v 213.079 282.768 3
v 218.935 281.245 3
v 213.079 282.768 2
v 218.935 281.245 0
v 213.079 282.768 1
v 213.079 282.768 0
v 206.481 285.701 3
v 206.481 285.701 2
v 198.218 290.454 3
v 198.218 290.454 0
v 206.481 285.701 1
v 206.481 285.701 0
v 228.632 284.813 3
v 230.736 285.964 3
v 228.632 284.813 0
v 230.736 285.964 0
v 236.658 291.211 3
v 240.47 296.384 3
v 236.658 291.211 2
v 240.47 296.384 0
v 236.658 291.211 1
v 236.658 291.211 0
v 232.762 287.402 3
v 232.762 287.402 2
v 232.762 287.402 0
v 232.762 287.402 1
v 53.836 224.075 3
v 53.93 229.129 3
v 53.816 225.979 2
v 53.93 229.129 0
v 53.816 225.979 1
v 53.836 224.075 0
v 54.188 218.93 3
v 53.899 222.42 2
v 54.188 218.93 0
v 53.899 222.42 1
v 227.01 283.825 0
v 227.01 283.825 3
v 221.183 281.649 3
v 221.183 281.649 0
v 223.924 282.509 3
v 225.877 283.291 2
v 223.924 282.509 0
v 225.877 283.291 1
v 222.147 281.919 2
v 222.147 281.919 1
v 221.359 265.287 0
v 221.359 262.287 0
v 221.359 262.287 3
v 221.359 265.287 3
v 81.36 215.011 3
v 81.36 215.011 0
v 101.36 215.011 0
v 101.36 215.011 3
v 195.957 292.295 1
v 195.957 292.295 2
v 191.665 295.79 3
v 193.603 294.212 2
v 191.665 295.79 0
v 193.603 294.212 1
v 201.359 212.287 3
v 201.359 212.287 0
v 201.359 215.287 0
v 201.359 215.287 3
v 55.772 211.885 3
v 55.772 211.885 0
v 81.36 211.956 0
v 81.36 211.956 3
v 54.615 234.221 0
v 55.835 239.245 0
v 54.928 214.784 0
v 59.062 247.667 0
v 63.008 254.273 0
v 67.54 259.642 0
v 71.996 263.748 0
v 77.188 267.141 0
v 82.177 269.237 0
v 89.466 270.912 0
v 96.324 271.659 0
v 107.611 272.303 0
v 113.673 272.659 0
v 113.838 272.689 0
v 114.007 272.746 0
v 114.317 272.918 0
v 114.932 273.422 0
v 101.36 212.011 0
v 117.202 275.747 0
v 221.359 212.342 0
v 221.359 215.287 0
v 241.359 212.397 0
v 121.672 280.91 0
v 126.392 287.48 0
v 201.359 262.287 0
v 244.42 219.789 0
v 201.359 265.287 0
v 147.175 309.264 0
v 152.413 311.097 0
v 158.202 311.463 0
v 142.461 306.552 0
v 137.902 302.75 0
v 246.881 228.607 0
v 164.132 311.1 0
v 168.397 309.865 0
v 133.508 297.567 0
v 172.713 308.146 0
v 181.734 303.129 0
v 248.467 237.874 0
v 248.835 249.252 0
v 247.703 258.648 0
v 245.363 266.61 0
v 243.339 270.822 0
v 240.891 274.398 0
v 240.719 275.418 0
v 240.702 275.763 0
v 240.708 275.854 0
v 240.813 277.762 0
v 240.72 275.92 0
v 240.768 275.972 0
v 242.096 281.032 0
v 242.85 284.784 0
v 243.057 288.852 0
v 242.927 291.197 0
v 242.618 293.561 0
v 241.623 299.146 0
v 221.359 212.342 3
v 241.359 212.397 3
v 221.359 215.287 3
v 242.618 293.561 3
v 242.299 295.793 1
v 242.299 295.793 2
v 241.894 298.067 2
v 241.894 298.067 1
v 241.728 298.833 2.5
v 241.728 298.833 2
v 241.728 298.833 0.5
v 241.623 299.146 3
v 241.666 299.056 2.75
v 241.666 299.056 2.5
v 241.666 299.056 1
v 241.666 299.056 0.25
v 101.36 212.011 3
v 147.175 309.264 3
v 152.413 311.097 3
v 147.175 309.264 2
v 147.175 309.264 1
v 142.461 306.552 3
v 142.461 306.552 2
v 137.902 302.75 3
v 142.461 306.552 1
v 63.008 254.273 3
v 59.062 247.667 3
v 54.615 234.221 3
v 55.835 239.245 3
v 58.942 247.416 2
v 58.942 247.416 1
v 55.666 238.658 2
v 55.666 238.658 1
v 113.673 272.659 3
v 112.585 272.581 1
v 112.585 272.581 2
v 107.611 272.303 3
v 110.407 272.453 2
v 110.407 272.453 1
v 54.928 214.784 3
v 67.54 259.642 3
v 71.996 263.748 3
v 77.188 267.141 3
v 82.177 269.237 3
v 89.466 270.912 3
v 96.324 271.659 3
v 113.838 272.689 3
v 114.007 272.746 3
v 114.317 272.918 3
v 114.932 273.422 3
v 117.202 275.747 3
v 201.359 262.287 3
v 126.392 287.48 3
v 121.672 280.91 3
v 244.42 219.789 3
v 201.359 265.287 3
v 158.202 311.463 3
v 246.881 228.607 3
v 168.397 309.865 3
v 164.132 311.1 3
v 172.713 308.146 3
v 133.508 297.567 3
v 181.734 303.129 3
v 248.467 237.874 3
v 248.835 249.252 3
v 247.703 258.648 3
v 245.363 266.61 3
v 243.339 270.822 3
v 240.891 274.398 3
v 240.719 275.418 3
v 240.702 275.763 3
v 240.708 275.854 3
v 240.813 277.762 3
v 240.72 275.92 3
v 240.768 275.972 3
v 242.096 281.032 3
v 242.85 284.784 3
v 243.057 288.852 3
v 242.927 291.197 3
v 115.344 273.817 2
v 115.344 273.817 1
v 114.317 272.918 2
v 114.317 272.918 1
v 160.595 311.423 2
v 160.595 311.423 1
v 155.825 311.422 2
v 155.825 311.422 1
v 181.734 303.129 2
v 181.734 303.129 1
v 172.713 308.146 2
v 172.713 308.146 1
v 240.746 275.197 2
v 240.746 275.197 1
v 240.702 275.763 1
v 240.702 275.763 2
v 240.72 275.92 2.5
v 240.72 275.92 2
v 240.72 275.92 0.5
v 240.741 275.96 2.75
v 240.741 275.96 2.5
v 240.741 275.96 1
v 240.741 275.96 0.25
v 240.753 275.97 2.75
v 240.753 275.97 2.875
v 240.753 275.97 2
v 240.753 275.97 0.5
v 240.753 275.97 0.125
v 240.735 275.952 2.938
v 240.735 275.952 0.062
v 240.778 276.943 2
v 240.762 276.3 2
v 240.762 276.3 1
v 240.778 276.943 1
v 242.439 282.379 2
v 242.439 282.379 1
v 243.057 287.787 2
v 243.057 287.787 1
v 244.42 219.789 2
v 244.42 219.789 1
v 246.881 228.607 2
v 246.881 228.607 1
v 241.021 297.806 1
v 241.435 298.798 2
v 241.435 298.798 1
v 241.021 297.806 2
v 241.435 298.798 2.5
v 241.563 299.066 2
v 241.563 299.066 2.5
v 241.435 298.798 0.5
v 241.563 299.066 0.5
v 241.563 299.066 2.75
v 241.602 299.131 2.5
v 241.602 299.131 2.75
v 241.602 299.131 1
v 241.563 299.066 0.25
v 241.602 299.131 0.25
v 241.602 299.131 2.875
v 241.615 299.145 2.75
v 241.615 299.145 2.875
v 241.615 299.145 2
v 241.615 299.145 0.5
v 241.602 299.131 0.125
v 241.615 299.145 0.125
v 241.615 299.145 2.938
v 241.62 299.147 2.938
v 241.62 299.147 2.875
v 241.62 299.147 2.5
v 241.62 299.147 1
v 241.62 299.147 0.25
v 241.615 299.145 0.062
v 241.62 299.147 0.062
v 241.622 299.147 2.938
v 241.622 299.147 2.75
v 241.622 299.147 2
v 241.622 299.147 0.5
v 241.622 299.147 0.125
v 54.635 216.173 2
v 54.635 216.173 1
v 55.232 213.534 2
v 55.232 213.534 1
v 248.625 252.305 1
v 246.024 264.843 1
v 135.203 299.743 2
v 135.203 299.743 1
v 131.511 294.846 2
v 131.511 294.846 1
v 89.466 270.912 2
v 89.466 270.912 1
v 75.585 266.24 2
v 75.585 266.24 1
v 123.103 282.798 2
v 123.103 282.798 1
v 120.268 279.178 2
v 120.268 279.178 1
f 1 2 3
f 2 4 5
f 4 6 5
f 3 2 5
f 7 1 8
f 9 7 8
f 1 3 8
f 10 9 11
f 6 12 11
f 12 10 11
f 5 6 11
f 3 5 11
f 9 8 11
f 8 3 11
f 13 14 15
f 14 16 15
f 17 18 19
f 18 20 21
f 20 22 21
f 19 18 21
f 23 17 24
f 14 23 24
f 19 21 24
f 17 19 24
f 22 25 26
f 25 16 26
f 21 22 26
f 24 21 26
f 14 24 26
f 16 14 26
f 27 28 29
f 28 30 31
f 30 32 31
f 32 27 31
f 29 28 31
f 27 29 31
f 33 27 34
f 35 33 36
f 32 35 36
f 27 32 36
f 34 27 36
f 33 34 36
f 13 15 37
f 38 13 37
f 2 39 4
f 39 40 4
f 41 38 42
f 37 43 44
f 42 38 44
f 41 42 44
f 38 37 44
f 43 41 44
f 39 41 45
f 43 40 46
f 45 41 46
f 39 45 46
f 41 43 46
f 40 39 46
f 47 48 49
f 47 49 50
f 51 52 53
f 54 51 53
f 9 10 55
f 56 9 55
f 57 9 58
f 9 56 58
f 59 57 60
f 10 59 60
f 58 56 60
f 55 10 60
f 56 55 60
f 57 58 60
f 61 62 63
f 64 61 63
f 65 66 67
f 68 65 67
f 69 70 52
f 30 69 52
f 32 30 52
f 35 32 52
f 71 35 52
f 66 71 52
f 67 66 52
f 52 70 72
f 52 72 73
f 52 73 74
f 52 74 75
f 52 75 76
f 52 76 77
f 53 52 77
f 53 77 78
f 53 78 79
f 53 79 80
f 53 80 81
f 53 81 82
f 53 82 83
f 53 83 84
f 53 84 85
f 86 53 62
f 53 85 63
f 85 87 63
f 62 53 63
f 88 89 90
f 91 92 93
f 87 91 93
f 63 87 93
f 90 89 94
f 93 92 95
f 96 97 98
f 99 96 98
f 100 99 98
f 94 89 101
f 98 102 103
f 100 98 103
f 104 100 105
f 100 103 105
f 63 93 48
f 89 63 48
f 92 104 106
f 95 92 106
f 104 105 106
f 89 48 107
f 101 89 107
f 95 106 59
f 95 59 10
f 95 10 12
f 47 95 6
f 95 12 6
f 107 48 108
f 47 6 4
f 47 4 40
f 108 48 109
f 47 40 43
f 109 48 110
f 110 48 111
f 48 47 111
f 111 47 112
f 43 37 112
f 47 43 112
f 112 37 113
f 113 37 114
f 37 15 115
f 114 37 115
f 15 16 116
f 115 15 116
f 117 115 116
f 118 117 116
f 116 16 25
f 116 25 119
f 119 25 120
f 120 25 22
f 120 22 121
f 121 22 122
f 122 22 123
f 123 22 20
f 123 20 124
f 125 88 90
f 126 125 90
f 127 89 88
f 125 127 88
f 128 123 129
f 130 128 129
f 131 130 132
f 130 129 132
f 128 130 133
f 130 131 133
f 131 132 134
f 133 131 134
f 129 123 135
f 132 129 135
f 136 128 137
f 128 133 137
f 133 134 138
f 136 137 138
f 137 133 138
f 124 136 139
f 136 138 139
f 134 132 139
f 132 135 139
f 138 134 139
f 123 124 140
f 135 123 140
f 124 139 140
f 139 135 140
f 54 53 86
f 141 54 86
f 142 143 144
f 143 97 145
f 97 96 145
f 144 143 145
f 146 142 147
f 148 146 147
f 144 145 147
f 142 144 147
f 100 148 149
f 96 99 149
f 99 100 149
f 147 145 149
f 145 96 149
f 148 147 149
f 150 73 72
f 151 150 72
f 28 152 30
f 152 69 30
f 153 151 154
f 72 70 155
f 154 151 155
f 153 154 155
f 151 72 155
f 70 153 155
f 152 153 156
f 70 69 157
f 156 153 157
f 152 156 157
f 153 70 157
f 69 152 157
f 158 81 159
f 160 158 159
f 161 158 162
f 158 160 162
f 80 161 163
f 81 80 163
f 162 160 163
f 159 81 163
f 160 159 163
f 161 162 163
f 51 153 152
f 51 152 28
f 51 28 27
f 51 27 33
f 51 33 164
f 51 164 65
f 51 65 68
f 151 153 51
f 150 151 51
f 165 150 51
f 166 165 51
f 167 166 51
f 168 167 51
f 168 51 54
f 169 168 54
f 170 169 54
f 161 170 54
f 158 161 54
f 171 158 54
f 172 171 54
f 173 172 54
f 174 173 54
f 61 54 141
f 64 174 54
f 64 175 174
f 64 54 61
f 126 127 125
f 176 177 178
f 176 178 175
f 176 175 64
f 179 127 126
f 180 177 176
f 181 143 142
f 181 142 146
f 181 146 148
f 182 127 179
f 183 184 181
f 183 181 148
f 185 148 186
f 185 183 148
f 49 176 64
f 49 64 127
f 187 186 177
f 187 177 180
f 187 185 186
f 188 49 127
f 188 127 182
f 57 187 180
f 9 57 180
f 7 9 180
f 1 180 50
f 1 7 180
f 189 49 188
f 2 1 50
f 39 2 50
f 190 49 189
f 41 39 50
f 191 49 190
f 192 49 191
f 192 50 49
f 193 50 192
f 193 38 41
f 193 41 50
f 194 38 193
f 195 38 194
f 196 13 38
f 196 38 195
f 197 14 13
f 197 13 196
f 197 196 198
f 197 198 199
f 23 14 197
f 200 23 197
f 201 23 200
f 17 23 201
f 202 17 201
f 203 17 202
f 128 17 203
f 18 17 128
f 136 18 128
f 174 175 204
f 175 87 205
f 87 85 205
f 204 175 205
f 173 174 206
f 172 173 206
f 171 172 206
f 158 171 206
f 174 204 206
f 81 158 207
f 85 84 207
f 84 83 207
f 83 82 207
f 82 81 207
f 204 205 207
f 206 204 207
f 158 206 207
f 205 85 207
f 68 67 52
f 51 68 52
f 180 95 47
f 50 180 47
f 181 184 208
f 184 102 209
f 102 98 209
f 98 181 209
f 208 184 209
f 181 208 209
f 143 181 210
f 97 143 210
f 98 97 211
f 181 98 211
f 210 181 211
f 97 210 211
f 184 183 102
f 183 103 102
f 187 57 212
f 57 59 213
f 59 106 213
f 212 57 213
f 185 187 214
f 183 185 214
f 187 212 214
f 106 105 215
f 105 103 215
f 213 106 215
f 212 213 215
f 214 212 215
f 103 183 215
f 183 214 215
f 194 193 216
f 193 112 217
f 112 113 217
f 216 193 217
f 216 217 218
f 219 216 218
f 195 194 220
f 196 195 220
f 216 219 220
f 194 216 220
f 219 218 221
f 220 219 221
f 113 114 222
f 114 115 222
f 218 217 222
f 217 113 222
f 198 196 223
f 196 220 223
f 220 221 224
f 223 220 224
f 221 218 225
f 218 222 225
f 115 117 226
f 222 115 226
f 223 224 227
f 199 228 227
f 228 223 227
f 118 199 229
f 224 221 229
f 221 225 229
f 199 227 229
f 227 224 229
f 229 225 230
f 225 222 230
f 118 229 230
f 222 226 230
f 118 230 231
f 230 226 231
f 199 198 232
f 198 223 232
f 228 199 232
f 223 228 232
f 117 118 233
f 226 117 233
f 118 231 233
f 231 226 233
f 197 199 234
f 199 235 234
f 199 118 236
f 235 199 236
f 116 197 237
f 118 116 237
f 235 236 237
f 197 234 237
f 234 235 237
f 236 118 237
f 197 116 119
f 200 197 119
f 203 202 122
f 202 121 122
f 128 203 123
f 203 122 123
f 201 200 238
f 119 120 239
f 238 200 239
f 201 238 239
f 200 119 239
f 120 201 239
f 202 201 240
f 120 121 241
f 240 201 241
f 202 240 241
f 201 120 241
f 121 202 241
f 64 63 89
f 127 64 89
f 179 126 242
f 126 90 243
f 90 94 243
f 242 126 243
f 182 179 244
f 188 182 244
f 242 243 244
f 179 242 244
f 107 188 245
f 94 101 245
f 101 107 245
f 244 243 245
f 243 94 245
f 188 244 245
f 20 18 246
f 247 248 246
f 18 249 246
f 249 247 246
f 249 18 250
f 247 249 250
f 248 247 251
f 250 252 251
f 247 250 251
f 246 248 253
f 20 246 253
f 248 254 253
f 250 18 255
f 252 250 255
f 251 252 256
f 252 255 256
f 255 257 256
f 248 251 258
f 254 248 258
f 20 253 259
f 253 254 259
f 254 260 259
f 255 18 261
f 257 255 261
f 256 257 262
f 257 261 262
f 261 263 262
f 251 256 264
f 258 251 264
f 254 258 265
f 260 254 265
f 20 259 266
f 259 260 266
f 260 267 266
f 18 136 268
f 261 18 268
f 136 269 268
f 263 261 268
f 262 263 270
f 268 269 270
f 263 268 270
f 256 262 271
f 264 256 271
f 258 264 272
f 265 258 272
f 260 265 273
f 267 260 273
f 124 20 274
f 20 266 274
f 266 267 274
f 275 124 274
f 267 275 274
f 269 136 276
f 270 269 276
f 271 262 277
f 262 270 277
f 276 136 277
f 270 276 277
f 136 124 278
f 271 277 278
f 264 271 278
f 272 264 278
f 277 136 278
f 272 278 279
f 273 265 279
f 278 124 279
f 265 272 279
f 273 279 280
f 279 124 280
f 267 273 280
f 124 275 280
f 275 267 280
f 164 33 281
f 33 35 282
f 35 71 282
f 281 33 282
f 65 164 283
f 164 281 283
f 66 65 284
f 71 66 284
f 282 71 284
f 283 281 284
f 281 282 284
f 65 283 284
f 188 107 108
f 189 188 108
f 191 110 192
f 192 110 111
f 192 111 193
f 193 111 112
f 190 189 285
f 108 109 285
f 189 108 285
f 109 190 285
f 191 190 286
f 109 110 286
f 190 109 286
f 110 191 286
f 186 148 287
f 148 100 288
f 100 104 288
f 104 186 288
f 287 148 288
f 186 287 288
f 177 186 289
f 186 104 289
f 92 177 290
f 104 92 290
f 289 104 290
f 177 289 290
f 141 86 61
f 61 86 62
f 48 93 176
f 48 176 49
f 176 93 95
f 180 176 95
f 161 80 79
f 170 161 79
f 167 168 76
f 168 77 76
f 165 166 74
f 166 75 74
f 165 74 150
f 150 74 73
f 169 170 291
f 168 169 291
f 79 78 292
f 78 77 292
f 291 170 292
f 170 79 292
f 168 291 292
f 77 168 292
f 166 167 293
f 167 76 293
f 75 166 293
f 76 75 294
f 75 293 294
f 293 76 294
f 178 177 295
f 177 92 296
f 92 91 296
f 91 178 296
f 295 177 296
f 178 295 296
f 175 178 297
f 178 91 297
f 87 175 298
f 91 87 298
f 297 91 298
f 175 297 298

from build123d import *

# Parameters (mm, degrees)
SKETCH1_W           = 20
SKETCH1_H           = 3
BOSS_EXTRUDE1_DEPTH = 3


with BuildPart() as part:
    # Sketch1 → Boss-Extrude1 (new body)
    # profile 1 of 3: a face of its own
    with BuildSketch(Plane.XY):
        with BuildLine():
            add(Edge.make_bspline(
                [(240.469820829, 296.383844032), (236.651125345, 290.479775846), (232.928874324, 286.841309227), (228.632144795, 284.812613295)],
                knots=[0, 0, 0, 0, 1, 1, 1, 1], degree=3))
            add(Edge.make_bspline(
                [(228.632144795, 284.812613295), (226.861147306, 283.399689538), (221.392042444, 281.387343093), (218.93484187, 281.244531384)],
                knots=[0, 0, 0, 0, 1, 1, 1, 1], degree=3))
            add(Edge.make_bspline(
                [(218.93484187, 281.244531384), (213.142066592, 282.199369906), (207.621000721, 284.653770769), (198.217921477, 290.454290235)],
                knots=[0, 0, 0, 0, 1, 1, 1, 1], degree=3))
            add(Edge.make_bspline(
                [(198.217921477, 290.454290235), (196.173393477, 292.118481235), (193.224738477, 294.519464235), (191.665350477, 295.789808235)],
                knots=[0, 0, 0, 0, 1, 1, 1, 1], degree=3))
            add(Edge.make_bspline(
                [(191.665350477, 295.789808235), (181.123444477, 304.377742235), (172.648779477, 309.090312235), (164.131959477, 311.100493235)],
                knots=[0, 0, 0, 0, 1, 1, 1, 1], degree=3))
            add(Edge.make_bspline(
                [(164.131959477, 311.100493235), (162.075544477, 311.585852235), (154.282194477, 311.583190235), (152.412943477, 311.096855235)],
                knots=[0, 0, 0, 0, 1, 1, 1, 1], degree=3))
            add(Edge.make_bspline(
                [(152.412943477, 311.096855235), (146.791988477, 309.633287235), (142.504601477, 307.167024235), (137.901986477, 302.749608235)],
                knots=[0, 0, 0, 0, 1, 1, 1, 1], degree=3))
            add(Edge.make_bspline(
                [(137.901986477, 302.749608235), (135.553087477, 300.495235235), (132.370938477, 296.273870235), (126.391682477, 287.480322235)],
                knots=[0, 0, 0, 0, 1, 1, 1, 1], degree=3))
            add(Edge.make_bspline(
                [(126.391682477, 287.480322235), (122.648888477, 281.975879235), (120.611935477, 279.375243235), (117.201573477, 275.747032235)],
                knots=[0, 0, 0, 0, 1, 1, 1, 1], degree=3))
            add(Edge.make_bspline(
                [(117.201573477, 275.747032235), (114.779872477, 273.170633235), (114.274522477, 272.728335235), (113.673270477, 272.659053235)],
                knots=[0, 0, 0, 0, 1, 1, 1, 1], degree=3))
            add(Edge.make_bspline(
                [(113.673270477, 272.659053235), (113.287311477, 272.614543235), (110.559377477, 272.454465235), (107.611210477, 272.303276235)],
                knots=[0, 0, 0, 0, 1, 1, 1, 1], degree=3))
            add(Edge.make_bspline(
                [(107.611210477, 272.303276235), (86.346815477, 271.212768235), (75.919051477, 271.227091235), (63.008175477, 254.273392235)],
                knots=[0, 0, 0, 0, 1, 1, 1, 1], degree=3))
            add(Edge.make_bspline(
                [(63.008175477, 254.273392235), (58.796714477, 248.743189235), (54.645708477, 238.666261235), (53.930170477, 229.128885235)],
                knots=[0, 0, 0, 0, 1, 1, 1, 1], degree=3))
            add(Edge.make_bspline(
                [(53.930170477, 229.128885235), (53.721105477, 226.342367235), (53.792620477, 222.226585235), (54.187873477, 218.929577235)],
                knots=[0, 0, 0, 0, 1, 1, 1, 1], degree=3))
            add(Edge.make_bspline(
                [(54.187873477, 218.929577235), (54.490646477, 216.403965235), (55.330161477, 212.748448235), (55.771613477, 211.884964235)],
                knots=[0, 0, 0, 0, 1, 1, 1, 1], degree=3))
            Line((55.771613477, 211.884964235), (81.359563224, 211.955586631))
            Line((81.359563224, 211.955586631), (81.359563224, 215.010786361))
            Line((81.359563224, 215.010786361), (101.359563224, 215.010786361))
            Line((101.359563224, 215.010786361), (101.359563224, 212.010786361))
            Line((101.359563224, 212.010786361), (201.35903, 212.28678354))
            Line((201.35903, 212.28678354), (201.35903, 215.28678354))
            Line((201.35903, 215.28678354), (221.35903, 215.28678354))
            Line((221.35903, 215.28678354), (221.35903, 212.34198327))
            Line((221.35903, 212.34198327), (241.35903, 212.397183))
            add(Edge.make_bspline(
                [(241.35903, 212.397183), (244.629305861, 218.748817068), (247.40859442, 228.709873239), (248.46742676, 237.873897093)],
                knots=[0, 0, 0, 0, 1, 1, 1, 1], degree=3))
            add(Edge.make_bspline(
                [(248.46742676, 237.873897093), (250.079518862, 252.887800903), (247.215041867, 266.697425469), (240.891378893, 274.398057325)],
                knots=[0, 0, 0, 0, 1, 1, 1, 1], degree=3))
            add(Edge.make_bspline(
                [(240.891378893, 274.398057325), (240.698521086, 275.27358016), (240.643056085, 275.981882336), (240.76811836, 275.972073931)],
                knots=[0, 0, 0, 0, 1, 1, 1, 1], degree=3))
            add(Edge.make_bspline(
                [(240.76811836, 275.972073931), (240.748909131, 276.096033997), (240.769278751, 276.901273493), (240.813388464, 277.761500997)],
                knots=[0, 0, 0, 0, 1, 1, 1, 1], degree=3))
            add(Edge.make_bspline(
                [(240.813388464, 277.761500997), (242.927080797, 281.842540784), (243.601341236, 287.745758426), (242.61801967, 293.561188973)],
                knots=[0, 0, 0, 0, 1, 1, 1, 1], degree=3))
            add(Edge.make_bspline(
                [(242.61801967, 293.561188973), (242.415605619, 295.360351559), (241.753508901, 299.076632619), (241.623073366, 299.145691082)],
                knots=[0, 0, 0, 0, 1, 1, 1, 1], degree=3))
            add(Edge.make_bspline(
                [(241.623073366, 299.145691082), (241.578638706, 299.19165546), (241.059652967, 297.948834469), (240.469820829, 296.383844032)],
                knots=[0, 0, 0, 0, 1, 1, 1, 1], degree=3))
        make_face()
        with Locations((211.35903, 263.78678354)):
            Rectangle(SKETCH1_W, SKETCH1_H, mode=Mode.SUBTRACT)
        with BuildLine():
            add(Edge.make_bspline(
                [(201.843236026, 279.741376594), (201.523376635, 280.02936203), (200.901282099, 280.593624889), (199.543639419, 281.846281217), (197.721364001, 283.549658829), (195.33366628, 285.777696204), (191.919276726, 288.908047707), (187.264875178, 292.981443354), (181.210308448, 297.675476133), (174.816425919, 301.728836363), (168.187651337, 304.68610159), (162.530063372, 305.81688333), (157.984525923, 305.614260568), (153.530958932, 304.555467323), (148.375122164, 301.880565273), (142.705289246, 297.240779546), (137.461776484, 291.744535415), (132.597431172, 285.942234601), (128.850565667, 281.314306121), (126.048127718, 278.023842232), (124.052495255, 275.836492497), (122.490714258, 274.313065528), (121.53740178, 273.498180089), (121.111683759, 273.161071858), (120.789718866, 272.907682621), (119.931571273, 272.231329661), (118.510544623, 271.11196569), (117.254230449, 270.122097355), (116.625220784, 269.626522955)],
                knots=[-0.00190331, -0.00190331, -0.00190331, -0.00190331, 0.015021831, 0.031946973, 0.065797257, 0.09964754, 0.133497824, 0.201198391, 0.268898959, 0.336599526, 0.404300093, 0.47200066, 0.505850944, 0.539701228, 0.607401795, 0.675102362, 0.742802929, 0.810503496, 0.878204064, 0.912054347, 0.945904631, 0.979754915, 0.996680056, 1.000911342, 1.005142627, 1.013605198, 1.047455482, 1.081305765, 1.081305765, 1.081305765, 1.081305765], degree=3))
            Line((116.625220784, 269.626522955), (210.272280725, 269.626522955))
            Line((210.272280725, 269.626522955), (201.843236026, 279.741376594))
        make_face(mode=Mode.SUBTRACT)
    # profile 2 of 3: a face of its own
    with BuildSketch(Plane.XY):
        with BuildLine():
            Line((210.272280725, 269.626522955), (201.843236026, 279.741376594))
            add(Edge.make_bspline(
                [(201.843236026, 279.741376594), (201.523376635, 280.02936203), (200.901282099, 280.593624889), (199.543639419, 281.846281217), (197.721364001, 283.549658829), (195.33366628, 285.777696204), (191.919276726, 288.908047707), (187.264875178, 292.981443354), (181.210308448, 297.675476133), (174.816425919, 301.728836363), (168.187651337, 304.68610159), (162.530063372, 305.81688333), (157.984525923, 305.614260568), (153.530958932, 304.555467323), (148.375122164, 301.880565273), (142.705289246, 297.240779546), (137.461776484, 291.744535415), (132.597431172, 285.942234601), (128.850565667, 281.314306121), (126.048127718, 278.023842232), (124.052495255, 275.836492497), (122.490714258, 274.313065528), (121.53740178, 273.498180089), (121.111683759, 273.161071858), (120.789718866, 272.907682621), (119.931571273, 272.231329661), (118.510544623, 271.11196569), (117.254230449, 270.122097355), (116.625220784, 269.626522955)],
                knots=[-0.00190331, -0.00190331, -0.00190331, -0.00190331, 0.015021831, 0.031946973, 0.065797257, 0.09964754, 0.133497824, 0.201198391, 0.268898959, 0.336599526, 0.404300093, 0.47200066, 0.505850944, 0.539701228, 0.607401795, 0.675102362, 0.742802929, 0.810503496, 0.878204064, 0.912054347, 0.945904631, 0.979754915, 0.996680056, 1.000911342, 1.005142627, 1.013605198, 1.047455482, 1.081305765, 1.081305765, 1.081305765, 1.081305765], degree=3))
            Line((116.625220784, 269.626522955), (210.272280725, 269.626522955))
        make_face()
        with BuildLine():
            add(Edge.make_bspline(
                [(200.398528045, 278.350926301), (190.867543037, 286.932149658), (155.755536364, 324.252253924), (131.48134266, 278.784976047), (122.395449235, 271.626522955)],
                knots=[0, 0, 0, 0, 0.511040789, 1, 1, 1, 1], degree=3))
            Line((122.395449235, 271.626522955), (206.0021975, 271.626522955))
            Line((206.0021975, 271.626522955), (200.398528045, 278.350926301))
        make_face(mode=Mode.SUBTRACT)
    # profile 3 of 3: a face of its own
    with BuildSketch(Plane.XY):
        with BuildLine():
            Line((206.0021975, 271.626522955), (200.398528045, 278.350926301))
            add(Edge.make_bspline(
                [(200.398528045, 278.350926301), (190.867543037, 286.932149658), (155.755536364, 324.252253924), (131.48134266, 278.784976047), (122.395449235, 271.626522955)],
                knots=[0, 0, 0, 0, 0.511040789, 1, 1, 1, 1], degree=3))
            Line((122.395449235, 271.626522955), (206.0021975, 271.626522955))
        make_face()
    extrude(amount=BOSS_EXTRUDE1_DEPTH)


solid = part.part
